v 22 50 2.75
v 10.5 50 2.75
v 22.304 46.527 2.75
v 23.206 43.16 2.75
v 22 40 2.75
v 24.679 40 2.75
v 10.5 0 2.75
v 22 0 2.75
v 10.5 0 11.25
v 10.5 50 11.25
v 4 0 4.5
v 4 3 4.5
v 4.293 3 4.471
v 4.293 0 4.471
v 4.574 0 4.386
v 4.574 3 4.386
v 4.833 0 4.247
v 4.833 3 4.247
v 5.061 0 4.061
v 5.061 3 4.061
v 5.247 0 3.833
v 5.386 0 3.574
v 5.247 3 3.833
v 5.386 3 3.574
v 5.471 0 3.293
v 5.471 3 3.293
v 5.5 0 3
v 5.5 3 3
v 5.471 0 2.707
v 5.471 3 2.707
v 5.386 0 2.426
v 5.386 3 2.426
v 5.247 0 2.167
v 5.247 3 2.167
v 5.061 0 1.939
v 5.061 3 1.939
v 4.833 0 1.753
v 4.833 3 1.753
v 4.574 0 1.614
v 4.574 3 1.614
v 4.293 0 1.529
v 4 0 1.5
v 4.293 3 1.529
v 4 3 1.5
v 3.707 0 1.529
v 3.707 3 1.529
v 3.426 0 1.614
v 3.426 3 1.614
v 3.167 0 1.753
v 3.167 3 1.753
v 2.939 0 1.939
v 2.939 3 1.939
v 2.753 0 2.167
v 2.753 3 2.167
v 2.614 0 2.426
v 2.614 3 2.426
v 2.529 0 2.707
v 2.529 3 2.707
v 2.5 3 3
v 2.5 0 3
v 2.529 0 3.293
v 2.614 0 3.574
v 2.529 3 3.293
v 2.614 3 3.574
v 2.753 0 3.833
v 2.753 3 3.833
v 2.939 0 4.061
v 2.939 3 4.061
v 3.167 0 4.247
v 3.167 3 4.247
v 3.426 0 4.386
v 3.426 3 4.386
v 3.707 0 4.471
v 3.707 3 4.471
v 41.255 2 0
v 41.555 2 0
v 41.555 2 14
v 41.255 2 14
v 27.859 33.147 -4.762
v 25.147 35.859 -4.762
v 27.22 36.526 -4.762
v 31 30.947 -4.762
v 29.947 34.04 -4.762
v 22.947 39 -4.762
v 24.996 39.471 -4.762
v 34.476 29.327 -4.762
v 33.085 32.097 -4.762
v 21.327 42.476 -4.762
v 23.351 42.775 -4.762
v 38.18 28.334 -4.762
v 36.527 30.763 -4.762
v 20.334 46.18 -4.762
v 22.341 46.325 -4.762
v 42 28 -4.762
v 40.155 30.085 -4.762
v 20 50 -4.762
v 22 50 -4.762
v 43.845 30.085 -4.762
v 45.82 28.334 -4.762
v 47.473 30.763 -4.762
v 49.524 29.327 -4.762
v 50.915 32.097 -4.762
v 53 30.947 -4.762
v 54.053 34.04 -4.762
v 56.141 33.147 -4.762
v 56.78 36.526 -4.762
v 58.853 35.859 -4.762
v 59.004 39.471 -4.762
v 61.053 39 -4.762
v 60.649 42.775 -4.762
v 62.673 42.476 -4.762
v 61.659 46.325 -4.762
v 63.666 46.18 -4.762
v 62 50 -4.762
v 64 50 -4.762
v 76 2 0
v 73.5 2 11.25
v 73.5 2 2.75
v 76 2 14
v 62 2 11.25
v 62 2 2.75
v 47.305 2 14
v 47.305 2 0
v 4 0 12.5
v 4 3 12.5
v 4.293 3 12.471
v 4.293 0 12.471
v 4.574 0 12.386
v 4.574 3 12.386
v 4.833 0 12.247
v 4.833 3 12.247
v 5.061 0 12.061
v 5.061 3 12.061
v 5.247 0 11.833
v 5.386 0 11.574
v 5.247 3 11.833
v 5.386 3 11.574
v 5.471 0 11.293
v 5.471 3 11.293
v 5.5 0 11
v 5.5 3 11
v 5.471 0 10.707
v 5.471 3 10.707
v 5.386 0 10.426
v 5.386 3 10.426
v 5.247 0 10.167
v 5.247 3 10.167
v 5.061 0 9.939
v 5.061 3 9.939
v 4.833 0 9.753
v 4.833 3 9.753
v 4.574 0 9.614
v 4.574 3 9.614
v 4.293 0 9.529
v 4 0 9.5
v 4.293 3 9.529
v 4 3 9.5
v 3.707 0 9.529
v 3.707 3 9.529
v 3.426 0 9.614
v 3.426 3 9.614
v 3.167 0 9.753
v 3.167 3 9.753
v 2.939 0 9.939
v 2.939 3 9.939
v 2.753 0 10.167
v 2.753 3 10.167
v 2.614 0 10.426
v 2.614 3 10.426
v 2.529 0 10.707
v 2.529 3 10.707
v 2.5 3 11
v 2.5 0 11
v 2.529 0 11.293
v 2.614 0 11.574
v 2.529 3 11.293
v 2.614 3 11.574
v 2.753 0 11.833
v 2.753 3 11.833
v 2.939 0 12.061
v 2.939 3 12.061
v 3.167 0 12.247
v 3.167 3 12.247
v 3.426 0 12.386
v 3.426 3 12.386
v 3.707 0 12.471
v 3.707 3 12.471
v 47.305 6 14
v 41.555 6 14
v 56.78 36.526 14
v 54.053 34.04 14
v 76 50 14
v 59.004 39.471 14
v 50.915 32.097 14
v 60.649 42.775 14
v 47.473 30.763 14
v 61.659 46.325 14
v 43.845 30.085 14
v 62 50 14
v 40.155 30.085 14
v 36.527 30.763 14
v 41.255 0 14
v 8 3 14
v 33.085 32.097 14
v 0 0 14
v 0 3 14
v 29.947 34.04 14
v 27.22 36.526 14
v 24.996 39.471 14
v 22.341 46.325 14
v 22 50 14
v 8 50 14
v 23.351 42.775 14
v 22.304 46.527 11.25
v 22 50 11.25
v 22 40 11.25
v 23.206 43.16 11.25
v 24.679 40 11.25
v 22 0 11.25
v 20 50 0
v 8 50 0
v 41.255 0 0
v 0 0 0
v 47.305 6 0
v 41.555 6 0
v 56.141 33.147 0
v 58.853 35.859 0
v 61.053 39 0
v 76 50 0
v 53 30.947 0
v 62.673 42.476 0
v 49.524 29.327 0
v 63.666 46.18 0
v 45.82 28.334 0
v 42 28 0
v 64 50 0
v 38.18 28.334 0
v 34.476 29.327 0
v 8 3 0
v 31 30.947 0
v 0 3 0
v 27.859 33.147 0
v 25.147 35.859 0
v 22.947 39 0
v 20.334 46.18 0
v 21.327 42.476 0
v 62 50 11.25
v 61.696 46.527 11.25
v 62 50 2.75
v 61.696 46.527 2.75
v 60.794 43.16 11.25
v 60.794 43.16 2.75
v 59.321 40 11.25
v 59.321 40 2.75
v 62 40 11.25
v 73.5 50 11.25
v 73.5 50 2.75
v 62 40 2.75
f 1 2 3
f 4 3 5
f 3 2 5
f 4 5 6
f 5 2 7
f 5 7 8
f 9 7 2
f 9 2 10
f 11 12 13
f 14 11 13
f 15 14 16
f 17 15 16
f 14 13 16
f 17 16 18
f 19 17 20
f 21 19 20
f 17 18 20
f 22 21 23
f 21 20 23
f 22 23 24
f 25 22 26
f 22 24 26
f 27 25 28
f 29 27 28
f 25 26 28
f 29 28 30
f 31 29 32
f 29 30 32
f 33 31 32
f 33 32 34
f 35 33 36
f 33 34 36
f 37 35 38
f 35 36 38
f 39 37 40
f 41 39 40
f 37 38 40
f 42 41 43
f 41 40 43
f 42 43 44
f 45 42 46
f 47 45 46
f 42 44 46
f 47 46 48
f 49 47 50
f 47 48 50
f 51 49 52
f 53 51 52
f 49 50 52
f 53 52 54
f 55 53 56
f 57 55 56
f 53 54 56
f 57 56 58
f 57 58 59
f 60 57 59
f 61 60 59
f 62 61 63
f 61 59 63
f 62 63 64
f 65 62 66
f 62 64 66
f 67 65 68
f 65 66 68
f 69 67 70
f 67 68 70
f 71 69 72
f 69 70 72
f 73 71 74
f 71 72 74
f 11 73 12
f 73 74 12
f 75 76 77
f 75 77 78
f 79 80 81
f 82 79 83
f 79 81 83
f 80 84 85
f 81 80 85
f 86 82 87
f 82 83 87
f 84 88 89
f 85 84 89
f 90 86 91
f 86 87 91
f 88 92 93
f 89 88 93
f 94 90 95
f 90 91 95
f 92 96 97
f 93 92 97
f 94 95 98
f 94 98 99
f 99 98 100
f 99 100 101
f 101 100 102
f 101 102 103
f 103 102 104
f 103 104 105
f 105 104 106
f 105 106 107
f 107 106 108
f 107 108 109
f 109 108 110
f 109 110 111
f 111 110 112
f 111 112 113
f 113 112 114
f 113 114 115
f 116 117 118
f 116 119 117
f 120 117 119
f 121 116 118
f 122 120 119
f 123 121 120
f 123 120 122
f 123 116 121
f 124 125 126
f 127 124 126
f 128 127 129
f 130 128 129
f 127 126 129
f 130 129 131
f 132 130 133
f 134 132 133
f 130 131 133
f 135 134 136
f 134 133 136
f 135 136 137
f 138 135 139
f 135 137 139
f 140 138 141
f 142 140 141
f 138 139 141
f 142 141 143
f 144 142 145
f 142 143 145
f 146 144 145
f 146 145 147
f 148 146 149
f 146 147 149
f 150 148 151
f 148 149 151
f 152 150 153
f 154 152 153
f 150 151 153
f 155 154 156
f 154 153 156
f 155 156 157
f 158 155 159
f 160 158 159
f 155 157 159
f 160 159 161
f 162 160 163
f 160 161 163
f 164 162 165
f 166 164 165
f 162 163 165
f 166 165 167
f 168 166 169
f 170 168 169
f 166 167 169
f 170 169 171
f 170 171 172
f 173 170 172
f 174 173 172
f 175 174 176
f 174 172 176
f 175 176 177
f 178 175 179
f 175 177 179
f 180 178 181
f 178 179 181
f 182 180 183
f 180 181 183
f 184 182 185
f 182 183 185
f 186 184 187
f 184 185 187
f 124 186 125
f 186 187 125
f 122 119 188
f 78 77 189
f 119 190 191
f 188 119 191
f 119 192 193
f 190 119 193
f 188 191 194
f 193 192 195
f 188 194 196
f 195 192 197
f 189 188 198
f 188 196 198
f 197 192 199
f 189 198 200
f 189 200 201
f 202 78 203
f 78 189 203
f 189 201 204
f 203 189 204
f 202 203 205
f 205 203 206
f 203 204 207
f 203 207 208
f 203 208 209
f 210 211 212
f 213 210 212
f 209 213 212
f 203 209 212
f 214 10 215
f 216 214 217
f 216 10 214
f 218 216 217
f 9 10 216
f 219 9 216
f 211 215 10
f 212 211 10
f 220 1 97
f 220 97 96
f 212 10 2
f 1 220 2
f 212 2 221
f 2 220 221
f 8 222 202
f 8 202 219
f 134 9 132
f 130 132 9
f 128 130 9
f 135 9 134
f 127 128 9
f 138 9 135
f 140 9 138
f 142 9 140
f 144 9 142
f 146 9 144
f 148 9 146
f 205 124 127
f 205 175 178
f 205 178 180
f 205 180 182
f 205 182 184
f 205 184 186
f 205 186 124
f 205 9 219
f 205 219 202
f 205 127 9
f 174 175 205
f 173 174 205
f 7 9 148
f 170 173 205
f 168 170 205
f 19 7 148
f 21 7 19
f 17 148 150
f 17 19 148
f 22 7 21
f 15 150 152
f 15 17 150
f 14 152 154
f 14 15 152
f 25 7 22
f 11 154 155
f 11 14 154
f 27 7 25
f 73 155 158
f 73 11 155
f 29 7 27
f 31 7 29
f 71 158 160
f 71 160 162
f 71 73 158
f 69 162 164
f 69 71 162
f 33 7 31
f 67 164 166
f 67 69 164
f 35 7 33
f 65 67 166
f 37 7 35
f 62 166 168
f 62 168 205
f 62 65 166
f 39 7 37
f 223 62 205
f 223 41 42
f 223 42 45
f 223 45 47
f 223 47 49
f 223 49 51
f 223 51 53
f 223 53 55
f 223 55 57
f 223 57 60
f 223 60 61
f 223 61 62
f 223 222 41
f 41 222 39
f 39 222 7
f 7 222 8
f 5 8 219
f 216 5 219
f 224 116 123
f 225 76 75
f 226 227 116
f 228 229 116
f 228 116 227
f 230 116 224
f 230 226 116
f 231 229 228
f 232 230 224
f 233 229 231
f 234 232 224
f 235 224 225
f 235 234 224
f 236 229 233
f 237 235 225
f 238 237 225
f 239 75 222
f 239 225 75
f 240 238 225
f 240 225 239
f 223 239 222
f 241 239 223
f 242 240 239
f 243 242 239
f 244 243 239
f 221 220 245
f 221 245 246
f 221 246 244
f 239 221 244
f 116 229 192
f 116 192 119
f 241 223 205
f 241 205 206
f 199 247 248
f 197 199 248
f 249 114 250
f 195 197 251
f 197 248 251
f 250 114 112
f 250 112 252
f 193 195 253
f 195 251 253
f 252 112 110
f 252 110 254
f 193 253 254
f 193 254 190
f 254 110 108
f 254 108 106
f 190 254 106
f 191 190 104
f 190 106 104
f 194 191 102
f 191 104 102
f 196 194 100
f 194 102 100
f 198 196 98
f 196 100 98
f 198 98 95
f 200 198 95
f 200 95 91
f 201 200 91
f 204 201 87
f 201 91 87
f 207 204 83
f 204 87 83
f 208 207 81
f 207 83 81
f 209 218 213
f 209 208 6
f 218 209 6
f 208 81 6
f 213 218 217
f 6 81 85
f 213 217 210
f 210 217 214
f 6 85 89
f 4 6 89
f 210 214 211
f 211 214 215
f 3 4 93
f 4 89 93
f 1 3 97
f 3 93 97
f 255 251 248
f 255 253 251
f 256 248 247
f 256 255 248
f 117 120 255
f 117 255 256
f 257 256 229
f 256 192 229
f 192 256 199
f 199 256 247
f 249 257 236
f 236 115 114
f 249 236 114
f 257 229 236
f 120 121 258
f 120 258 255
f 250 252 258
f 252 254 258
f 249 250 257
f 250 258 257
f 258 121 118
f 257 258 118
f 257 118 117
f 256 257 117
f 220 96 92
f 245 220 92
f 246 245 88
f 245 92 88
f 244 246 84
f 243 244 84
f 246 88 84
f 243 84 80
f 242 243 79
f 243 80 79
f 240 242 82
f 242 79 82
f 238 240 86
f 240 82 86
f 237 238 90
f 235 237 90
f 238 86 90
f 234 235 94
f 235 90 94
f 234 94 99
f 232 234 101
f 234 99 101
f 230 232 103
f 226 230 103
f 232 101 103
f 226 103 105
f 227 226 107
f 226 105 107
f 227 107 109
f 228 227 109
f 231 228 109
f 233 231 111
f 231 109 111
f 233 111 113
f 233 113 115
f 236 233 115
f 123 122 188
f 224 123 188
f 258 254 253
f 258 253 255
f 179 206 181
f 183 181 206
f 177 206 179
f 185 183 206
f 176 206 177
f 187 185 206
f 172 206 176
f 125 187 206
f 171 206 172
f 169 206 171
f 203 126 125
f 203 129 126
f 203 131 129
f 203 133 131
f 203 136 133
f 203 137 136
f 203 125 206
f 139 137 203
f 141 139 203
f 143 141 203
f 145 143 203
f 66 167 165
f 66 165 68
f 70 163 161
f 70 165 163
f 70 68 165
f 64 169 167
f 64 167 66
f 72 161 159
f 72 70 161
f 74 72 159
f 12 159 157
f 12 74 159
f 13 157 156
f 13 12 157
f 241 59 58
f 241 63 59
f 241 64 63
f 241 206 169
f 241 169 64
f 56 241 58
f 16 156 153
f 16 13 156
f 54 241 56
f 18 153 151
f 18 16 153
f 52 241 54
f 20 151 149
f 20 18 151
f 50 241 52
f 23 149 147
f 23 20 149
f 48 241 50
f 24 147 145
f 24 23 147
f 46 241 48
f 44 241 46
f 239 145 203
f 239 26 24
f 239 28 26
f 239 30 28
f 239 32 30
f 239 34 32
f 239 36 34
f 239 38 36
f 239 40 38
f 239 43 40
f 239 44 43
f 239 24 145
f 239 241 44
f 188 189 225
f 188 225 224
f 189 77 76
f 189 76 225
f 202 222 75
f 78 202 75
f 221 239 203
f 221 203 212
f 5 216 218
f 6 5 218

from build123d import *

# Parameters (mm, degrees)
BOSS_EXTRUDE1_DEPTH = 14
CUT_EXTRUDE1_REACH  = 94.043
SKETCH2_W           = 11.5
SKETCH2_H           = 8.5
SKETCH3_R           = 1.5
SCREW_HOLES_DEPTH   = 3
SKETCH4_W           = 63
SKETCH4_H           = 8.5
CUT_EXTRUDE2_DEPTH  = 10
CUT_EXTRUDE3_REACH  = 94.043
SKETCH5_W           = 34.745
SKETCH5_H           = 2
SKETCH6_W           = 5.75
SKETCH6_H           = 4
CUT_EXTRUDE4_DEPTH  = 14
BOSS_EXTRUDE2_START = -18.7625
BOSS_EXTRUDE2_DEPTH = 4.7625


with BuildPart() as part:
    # Sketch1 → Boss-Extrude1 (new body)
    with BuildSketch(Plane.XY):
        with BuildLine():
            Line((0, 0), (0, 3))
            Line((0, 3), (8, 3))
            Line((8, 3), (8, 50))
            Line((8, 50), (22, 50))
            ThreePointArc((22, 50), (42, 30), (62, 50))
            Line((62, 50), (76, 50))
            Line((76, 50), (76, 0))
            Line((76, 0), (0, 0))
        make_face()
    extrude(amount=BOSS_EXTRUDE1_DEPTH)

    # Cut-Extrude1: up to this face of the body (flat: up to its plane)
    cut_extrude1_end = Plane(part.part.faces().sort_by_distance((15, 50, 7))[0])
    # Sketch2 → Cut-Extrude1 (cut, up to the picked face)
    with BuildSketch(Plane.XZ, mode=Mode.PRIVATE) as cut_extrude1_sk1:
        with Locations((67.75, 7)):
            Rectangle(SKETCH2_W, SKETCH2_H)
    cut_extrude1_tool1 = split(extrude(cut_extrude1_sk1.sketch, amount=-CUT_EXTRUDE1_REACH, mode=Mode.PRIVATE), bisect_by=cut_extrude1_end, keep=Keep.BOTH, mode=Mode.PRIVATE)
    # Sketch2 → Cut-Extrude1 (cut, up to the picked face)
    with BuildSketch(Plane.XZ, mode=Mode.PRIVATE) as cut_extrude1_sk2:
        with Locations((16.25, 7)):
            Rectangle(SKETCH2_W, SKETCH2_H)
    cut_extrude1_tool2 = split(extrude(cut_extrude1_sk2.sketch, amount=-CUT_EXTRUDE1_REACH, mode=Mode.PRIVATE), bisect_by=cut_extrude1_end, keep=Keep.BOTH, mode=Mode.PRIVATE)
    add(cut_extrude1_tool1.solids().sort_by(Axis((67.75, 0, 7), (0, 1, 0)))[0], mode=Mode.SUBTRACT)
    add(cut_extrude1_tool2.solids().sort_by(Axis((16.25, 0, 7), (0, 1, 0)))[0], mode=Mode.SUBTRACT)

    # Sketch3 → screw holes (cut)
    with BuildSketch(Plane(origin=(0, 3, 0), x_dir=(1, 0, 0), z_dir=(0, 1, 0))):
        with Locations(Location((4, -3, 0), (0, 0, 270))):
            Circle(SKETCH3_R)
        with Locations(Location((4, -11, 0), (0, 0, 270))):
            Circle(SKETCH3_R)
    extrude(amount=-SCREW_HOLES_DEPTH, mode=Mode.SUBTRACT)

    # Sketch4 → Cut-Extrude2 (cut)
    with BuildSketch(Plane(origin=(0, 50, 0), x_dir=(1, 0, 0), z_dir=(0, 1, 0))):
        with Locations((42, -7)):
            Rectangle(SKETCH4_W, SKETCH4_H)
    extrude(amount=-CUT_EXTRUDE2_DEPTH, mode=Mode.SUBTRACT)

    # Cut-Extrude3: up to this face of the body (flat: up to its plane)
    cut_extrude3_end = Plane(part.part.faces().sort_by_distance((41.673782579, 21.087311786, 14))[0])
    # Sketch5 → Cut-Extrude3 (cut, up to the picked face)
    with BuildSketch(Plane(origin=(0, 0, 0), x_dir=(-1, 0, 0), z_dir=(0, 0, -1)), mode=Mode.PRIVATE) as cut_extrude3_sk1:
        with Locations((-58.6275, 1)):
            Rectangle(SKETCH5_W, SKETCH5_H)
    cut_extrude3_tool1 = split(extrude(cut_extrude3_sk1.sketch, amount=-CUT_EXTRUDE3_REACH, mode=Mode.PRIVATE), bisect_by=cut_extrude3_end, keep=Keep.BOTH, mode=Mode.PRIVATE)
    add(cut_extrude3_tool1.solids().sort_by(Axis((58.6275, 1, 0), (0, 0, 1)))[0], mode=Mode.SUBTRACT)

    # Sketch6 → Cut-Extrude4 (cut)
    with BuildSketch(Plane.XY.offset(14)):
        with Locations((44.43, 4)):
            Rectangle(SKETCH6_W, SKETCH6_H)
    extrude(amount=-CUT_EXTRUDE4_DEPTH, mode=Mode.SUBTRACT)

    # Sketch7 → Boss-Extrude2 (add)
    with BuildSketch(Plane.XY.offset(14).offset(BOSS_EXTRUDE2_START)):
        with BuildLine():
            Line((22, 50), (20, 50))
            ThreePointArc((20, 50), (42, 28), (64, 50))
            Line((64, 50), (62, 50))
            ThreePointArc((62, 50), (42, 30), (22, 50))
        make_face()
    extrude(amount=BOSS_EXTRUDE2_DEPTH)


solid = part.part
